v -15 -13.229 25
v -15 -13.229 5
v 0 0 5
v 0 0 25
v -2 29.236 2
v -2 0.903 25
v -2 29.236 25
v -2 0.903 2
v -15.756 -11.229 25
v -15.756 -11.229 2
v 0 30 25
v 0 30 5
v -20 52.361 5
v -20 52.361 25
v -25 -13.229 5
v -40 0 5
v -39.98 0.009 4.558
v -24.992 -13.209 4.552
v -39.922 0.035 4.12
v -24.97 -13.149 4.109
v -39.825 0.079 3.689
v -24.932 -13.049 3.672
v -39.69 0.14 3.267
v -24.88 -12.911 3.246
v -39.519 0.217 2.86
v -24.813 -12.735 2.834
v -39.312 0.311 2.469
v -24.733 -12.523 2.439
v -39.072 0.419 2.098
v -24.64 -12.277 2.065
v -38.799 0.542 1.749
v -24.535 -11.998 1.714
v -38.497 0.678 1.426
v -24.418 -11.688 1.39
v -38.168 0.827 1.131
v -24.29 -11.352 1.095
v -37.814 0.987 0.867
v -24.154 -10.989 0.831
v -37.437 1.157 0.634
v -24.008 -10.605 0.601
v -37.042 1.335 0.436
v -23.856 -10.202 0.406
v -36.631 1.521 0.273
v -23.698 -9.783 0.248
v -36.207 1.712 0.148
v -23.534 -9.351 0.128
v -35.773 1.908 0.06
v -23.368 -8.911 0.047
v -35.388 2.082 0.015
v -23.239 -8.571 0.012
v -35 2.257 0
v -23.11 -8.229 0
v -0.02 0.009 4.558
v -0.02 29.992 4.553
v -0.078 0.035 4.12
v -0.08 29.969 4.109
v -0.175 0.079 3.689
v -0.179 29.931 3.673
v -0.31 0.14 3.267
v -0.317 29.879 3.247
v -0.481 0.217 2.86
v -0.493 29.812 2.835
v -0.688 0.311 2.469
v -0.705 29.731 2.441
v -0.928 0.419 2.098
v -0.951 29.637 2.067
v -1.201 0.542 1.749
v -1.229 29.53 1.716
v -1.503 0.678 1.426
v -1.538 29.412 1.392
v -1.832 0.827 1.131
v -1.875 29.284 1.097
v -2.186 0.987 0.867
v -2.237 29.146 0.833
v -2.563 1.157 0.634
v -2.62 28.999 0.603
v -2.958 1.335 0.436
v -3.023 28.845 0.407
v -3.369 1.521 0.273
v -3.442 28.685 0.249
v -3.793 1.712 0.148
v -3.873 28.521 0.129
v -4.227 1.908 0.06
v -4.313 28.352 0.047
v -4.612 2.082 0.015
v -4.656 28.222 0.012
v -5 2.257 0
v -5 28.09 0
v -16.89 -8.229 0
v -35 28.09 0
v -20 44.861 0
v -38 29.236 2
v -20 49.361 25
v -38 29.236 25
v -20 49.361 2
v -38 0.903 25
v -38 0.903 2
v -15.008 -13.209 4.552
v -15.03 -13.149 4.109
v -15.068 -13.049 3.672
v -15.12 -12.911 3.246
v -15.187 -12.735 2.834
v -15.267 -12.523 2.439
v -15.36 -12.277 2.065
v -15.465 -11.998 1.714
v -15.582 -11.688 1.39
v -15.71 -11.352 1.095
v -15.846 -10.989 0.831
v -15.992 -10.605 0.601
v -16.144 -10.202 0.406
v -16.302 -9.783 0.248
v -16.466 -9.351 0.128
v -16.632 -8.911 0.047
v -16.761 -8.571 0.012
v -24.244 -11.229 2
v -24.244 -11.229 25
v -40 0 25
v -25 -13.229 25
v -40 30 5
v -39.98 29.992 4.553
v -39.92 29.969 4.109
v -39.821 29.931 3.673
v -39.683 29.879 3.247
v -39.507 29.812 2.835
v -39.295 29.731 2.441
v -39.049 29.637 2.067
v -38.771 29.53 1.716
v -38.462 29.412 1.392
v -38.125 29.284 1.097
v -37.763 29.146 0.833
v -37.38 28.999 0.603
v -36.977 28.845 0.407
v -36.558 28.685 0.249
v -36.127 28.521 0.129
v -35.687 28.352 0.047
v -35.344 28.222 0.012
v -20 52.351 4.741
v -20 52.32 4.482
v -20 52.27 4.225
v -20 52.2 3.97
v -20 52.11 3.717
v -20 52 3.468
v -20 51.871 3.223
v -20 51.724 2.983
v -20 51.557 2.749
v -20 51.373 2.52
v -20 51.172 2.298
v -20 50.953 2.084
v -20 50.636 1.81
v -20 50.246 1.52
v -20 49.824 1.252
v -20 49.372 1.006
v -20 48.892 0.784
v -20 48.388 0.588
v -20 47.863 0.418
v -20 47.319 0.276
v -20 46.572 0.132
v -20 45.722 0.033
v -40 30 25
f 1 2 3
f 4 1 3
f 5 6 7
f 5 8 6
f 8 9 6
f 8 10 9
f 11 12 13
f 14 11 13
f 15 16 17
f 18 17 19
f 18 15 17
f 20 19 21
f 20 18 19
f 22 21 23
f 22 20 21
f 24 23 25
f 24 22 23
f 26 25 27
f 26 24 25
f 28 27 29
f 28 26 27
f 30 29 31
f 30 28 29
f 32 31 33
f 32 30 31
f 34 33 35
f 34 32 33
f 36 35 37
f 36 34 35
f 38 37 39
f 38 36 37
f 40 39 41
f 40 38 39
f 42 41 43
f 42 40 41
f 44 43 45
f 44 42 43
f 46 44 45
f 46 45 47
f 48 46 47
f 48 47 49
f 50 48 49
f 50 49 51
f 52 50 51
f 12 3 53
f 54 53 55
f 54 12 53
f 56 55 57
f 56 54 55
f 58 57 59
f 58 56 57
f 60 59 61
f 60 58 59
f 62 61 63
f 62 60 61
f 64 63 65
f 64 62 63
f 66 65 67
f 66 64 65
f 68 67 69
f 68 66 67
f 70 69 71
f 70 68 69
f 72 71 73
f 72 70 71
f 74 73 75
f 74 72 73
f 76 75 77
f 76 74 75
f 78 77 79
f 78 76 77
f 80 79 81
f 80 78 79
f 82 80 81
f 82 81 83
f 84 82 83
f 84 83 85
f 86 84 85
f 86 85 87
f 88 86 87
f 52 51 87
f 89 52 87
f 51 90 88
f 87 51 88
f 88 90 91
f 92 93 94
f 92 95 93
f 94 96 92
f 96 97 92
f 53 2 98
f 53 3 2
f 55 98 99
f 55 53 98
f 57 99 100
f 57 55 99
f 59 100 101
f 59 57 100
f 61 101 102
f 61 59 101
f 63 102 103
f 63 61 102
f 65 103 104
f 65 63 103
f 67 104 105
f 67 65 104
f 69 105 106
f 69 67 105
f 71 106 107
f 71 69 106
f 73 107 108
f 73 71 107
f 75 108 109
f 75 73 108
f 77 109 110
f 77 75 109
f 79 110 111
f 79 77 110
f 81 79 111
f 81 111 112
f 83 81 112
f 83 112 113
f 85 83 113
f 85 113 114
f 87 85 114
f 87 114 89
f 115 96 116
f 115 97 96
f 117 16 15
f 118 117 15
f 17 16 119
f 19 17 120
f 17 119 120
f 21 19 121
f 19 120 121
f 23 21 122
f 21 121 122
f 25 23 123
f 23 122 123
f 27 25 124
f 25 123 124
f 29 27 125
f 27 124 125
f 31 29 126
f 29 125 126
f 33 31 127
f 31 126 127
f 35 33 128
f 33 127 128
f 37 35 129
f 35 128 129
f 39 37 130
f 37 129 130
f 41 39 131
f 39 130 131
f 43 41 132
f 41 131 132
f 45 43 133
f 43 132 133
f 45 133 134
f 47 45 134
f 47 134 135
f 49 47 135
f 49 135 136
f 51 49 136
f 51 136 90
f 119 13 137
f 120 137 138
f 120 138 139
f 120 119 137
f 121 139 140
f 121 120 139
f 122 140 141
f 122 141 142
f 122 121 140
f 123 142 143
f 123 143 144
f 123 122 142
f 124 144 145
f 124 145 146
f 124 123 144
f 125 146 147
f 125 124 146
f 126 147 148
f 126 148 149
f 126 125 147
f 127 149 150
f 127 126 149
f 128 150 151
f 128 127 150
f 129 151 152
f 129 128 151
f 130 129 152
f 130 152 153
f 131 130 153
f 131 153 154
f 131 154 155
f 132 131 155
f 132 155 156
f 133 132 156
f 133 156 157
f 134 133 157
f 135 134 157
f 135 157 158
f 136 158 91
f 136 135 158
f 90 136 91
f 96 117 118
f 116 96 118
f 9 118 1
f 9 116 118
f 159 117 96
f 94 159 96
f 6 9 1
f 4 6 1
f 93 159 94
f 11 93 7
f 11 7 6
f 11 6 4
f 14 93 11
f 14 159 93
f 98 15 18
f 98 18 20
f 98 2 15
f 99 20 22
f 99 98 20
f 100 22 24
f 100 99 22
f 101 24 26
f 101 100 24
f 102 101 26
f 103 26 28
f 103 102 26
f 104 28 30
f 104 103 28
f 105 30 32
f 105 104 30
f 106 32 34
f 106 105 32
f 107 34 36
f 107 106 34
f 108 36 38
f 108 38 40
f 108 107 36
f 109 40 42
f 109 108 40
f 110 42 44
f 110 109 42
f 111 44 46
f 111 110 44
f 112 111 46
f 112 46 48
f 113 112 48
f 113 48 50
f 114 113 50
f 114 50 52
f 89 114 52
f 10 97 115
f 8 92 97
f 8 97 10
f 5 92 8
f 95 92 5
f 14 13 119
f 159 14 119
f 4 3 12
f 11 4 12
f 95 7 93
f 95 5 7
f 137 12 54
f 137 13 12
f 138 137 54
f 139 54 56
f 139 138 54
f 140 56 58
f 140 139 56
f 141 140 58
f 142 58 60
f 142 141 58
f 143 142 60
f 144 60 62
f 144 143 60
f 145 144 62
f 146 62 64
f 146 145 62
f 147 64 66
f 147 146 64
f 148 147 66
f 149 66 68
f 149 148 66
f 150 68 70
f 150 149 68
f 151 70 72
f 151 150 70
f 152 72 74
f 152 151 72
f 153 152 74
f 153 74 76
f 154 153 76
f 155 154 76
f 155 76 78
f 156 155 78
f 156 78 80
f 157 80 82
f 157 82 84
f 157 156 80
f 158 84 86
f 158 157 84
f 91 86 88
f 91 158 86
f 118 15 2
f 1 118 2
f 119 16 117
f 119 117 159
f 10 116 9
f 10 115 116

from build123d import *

# Parameters (mm, degrees)
F0_W     = 40
F0_H     = 30
F1_DEPTH = 25
F2_T     = -2
F3_R     = 5


with BuildPart() as f1:
    # F0 (on Top) → F1 (new body)
    with BuildSketch(Plane.XY):
        Polygon((0, 30), (-20, 52.36068), (-40, 30), align=None)
        with Locations((-20, 15)):
            Rectangle(F0_W, F0_H)
        Polygon((0, 0), (-40, 0), (-25, -13.228757), (-15, -13.228757), align=None)
    extrude(amount=F1_DEPTH)

    # F2
    f2_openings = [f1.faces().sort_by_distance(p)[0] for p in [
        (-20, 16.683957, 25),
    ]]
    offset(amount=F2_T, openings=f2_openings)

    # F3
    f3_edges = [f1.edges().sort_by_distance(p)[0] for p in [
        (-40, 15, 0),
        (-30, 41.18034, 0),
        (-10, 41.18034, 0),
        (0, 15, 0),
        (-32.5, -6.614378, 0),
        (-7.5, -6.614378, 0),
        (-20, -13.228757, 0),
    ]]
    fillet(f3_edges, radius=F3_R)


solid = f1.part
